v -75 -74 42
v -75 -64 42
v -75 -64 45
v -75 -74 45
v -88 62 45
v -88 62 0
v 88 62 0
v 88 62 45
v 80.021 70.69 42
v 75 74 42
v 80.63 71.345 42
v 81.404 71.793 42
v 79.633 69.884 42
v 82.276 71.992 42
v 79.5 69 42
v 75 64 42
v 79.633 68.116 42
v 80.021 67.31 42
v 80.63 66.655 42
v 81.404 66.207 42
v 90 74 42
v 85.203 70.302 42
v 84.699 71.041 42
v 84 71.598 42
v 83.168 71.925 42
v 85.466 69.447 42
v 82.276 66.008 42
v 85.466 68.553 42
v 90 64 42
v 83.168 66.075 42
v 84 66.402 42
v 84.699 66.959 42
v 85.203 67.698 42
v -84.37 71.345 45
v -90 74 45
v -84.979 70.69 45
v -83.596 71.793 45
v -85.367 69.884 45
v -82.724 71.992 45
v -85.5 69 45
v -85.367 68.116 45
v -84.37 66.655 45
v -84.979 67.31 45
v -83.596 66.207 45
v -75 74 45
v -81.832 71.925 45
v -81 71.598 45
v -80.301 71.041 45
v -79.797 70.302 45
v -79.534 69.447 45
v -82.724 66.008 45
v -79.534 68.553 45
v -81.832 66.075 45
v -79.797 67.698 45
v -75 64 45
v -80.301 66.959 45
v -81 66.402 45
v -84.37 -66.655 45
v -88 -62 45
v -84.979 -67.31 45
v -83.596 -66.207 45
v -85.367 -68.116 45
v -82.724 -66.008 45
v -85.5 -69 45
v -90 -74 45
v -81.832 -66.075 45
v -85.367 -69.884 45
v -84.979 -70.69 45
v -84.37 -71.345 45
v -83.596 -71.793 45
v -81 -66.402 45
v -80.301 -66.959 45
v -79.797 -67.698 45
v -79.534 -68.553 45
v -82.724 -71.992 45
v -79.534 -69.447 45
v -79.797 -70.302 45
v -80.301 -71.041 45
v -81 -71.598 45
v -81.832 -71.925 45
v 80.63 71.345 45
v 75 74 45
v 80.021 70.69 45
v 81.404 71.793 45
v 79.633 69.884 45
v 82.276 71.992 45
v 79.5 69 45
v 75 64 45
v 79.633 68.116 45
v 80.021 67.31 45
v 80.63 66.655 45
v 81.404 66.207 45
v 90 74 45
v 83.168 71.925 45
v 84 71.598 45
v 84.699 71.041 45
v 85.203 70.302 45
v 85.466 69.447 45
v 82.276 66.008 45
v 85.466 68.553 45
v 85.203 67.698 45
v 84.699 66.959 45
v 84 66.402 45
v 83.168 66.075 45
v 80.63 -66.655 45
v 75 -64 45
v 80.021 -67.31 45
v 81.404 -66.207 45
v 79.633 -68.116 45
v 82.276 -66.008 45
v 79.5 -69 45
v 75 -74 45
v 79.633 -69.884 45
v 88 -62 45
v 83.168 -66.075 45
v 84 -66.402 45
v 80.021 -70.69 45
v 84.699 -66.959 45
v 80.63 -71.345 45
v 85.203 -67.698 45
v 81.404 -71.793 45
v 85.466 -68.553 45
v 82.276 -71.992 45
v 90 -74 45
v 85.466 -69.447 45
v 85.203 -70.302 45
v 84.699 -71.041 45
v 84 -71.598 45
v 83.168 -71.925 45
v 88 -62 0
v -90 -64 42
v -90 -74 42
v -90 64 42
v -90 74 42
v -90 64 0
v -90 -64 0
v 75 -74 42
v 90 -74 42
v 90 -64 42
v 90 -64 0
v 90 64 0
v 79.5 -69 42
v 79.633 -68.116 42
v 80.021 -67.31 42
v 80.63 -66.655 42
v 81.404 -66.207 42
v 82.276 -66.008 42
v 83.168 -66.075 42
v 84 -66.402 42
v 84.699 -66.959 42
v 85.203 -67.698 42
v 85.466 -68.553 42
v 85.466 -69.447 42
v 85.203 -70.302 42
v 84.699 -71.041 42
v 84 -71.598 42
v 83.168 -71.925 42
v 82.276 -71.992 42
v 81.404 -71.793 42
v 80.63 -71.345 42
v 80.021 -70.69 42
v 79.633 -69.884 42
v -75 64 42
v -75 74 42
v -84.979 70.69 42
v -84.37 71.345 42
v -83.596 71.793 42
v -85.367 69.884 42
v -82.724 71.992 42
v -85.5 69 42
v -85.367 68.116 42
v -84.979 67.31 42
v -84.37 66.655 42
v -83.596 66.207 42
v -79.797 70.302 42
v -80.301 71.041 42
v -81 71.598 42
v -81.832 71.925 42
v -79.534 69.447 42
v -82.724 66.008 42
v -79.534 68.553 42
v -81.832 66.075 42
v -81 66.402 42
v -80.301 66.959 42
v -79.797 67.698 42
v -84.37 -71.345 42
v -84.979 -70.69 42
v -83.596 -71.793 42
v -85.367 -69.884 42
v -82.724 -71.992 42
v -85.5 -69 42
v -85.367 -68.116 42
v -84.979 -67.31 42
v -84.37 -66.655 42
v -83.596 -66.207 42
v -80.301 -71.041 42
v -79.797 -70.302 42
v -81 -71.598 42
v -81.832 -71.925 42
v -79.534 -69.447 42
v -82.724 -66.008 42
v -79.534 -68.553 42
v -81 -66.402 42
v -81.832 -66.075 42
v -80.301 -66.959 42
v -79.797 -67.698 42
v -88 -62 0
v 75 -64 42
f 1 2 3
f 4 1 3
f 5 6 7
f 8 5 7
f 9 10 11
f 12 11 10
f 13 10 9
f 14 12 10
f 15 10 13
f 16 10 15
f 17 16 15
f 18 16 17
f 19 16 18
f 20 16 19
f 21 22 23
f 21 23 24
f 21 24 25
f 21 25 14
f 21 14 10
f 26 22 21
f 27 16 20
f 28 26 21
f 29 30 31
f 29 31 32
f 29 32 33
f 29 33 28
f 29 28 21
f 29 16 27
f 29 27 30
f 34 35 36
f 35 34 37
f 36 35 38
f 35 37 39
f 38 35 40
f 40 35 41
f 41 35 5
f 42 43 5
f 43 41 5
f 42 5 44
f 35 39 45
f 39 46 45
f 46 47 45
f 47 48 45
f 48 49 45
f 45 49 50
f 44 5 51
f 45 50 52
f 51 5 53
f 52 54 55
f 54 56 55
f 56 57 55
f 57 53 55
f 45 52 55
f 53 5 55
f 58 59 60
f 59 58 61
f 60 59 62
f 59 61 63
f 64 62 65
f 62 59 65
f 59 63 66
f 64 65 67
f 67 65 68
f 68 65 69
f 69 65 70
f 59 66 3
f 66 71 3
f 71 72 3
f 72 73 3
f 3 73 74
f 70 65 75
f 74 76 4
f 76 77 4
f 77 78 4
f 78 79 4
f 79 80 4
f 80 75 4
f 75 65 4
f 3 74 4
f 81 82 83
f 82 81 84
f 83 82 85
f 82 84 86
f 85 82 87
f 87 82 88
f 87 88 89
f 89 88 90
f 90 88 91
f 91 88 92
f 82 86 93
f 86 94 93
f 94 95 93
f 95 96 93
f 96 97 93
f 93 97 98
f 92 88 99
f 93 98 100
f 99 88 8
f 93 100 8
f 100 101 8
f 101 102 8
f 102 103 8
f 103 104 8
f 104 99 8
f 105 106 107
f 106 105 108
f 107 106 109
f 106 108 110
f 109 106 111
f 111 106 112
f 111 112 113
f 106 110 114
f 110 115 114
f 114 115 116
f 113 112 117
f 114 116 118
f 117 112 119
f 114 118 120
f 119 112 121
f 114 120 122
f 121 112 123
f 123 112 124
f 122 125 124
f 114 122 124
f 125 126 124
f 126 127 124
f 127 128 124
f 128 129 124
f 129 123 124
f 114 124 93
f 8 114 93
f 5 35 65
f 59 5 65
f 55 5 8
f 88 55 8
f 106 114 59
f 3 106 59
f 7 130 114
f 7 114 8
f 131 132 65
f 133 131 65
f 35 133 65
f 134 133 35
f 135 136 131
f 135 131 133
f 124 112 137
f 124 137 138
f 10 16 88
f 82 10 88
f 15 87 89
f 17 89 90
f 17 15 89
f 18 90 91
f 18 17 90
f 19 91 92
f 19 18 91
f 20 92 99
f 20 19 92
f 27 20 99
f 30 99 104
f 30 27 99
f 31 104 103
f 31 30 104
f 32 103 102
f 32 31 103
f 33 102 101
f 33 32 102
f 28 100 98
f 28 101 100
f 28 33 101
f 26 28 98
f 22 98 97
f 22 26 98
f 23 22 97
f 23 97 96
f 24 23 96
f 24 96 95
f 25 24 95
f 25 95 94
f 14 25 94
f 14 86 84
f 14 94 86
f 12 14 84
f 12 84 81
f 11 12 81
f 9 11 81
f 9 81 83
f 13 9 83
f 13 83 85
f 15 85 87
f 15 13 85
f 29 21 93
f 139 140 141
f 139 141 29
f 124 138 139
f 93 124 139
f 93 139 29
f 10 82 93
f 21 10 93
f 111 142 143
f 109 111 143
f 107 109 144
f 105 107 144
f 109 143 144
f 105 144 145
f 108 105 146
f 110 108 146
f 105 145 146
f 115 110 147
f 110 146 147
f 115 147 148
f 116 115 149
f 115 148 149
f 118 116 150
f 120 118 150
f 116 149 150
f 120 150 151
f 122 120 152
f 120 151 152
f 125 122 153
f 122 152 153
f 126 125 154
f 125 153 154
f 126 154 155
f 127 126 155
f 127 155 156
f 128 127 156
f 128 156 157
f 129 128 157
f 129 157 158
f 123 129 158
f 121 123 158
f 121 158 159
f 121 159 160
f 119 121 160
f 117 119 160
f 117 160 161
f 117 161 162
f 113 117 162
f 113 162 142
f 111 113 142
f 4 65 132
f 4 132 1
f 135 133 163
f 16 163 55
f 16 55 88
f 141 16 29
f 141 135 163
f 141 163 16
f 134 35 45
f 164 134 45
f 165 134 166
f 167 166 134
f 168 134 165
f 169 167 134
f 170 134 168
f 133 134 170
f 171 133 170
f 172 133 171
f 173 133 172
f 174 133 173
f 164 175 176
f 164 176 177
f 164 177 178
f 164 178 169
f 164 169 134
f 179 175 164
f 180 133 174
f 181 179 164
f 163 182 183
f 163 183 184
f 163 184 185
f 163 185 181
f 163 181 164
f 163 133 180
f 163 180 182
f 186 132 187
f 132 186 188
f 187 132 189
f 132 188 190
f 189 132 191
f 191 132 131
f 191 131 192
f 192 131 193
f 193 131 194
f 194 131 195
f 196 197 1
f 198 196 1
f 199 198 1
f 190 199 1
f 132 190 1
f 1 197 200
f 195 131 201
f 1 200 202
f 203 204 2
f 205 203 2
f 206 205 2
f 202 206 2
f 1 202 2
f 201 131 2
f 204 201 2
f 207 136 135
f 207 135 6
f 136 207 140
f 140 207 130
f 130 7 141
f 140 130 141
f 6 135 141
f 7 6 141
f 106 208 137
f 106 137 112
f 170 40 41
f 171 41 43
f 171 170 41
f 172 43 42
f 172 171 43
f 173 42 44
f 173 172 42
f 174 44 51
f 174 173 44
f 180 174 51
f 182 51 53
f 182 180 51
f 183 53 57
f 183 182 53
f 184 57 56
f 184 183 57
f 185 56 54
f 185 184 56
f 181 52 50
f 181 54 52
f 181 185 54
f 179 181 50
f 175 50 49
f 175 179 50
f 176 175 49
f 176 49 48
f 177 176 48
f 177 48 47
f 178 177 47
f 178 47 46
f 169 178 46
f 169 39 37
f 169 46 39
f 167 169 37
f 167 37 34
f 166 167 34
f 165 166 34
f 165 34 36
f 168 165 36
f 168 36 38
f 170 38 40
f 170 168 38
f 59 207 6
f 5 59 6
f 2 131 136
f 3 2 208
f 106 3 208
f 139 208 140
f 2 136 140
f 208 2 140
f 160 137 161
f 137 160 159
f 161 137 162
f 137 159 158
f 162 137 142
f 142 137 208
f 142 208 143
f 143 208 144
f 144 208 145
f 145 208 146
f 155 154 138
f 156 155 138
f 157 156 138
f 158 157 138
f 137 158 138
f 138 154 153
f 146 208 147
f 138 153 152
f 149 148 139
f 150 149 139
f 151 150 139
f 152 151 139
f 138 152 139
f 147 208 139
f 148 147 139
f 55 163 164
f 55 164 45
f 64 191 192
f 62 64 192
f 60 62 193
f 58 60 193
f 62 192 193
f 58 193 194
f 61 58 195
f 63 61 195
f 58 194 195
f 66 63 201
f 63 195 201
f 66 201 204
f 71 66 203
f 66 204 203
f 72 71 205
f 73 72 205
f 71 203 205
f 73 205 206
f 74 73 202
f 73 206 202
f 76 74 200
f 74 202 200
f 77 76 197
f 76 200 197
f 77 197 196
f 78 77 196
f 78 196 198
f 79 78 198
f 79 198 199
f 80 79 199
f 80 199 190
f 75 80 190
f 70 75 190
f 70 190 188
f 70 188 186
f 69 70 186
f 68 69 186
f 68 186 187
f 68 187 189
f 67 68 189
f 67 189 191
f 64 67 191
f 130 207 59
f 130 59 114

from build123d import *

# Parameters (mm, degrees)
SKETCH_1_W          = 180
SKETCH_1_H          = 128
SKETCH_1_W_2        = 176
SKETCH_1_H_2        = 124
EXTRUDE_1_DEPTH     = 45
SKETCH_2_W          = 15
SKETCH_2_H          = 3
EXTRUDE_2_DEPTH     = 10
SKETCH_3_R          = 3
CUT_EXTRUDE_1_DEPTH = 10


with BuildPart() as part:
    # 草圖1 → 填料-伸長1 (new body)
    with BuildSketch(Plane.XY):
        Rectangle(SKETCH_1_W, SKETCH_1_H)
        Rectangle(SKETCH_1_W_2, SKETCH_1_H_2, mode=Mode.SUBTRACT)
    extrude(amount=EXTRUDE_1_DEPTH)

    # 草圖2 → 填料-伸長2 (add)
    with BuildSketch(Plane.XZ.offset(64)):
        with Locations((82.5, 43.5)):
            Rectangle(SKETCH_2_W, SKETCH_2_H)
        with Locations((-82.5, 43.5)):
            Rectangle(SKETCH_2_W, SKETCH_2_H)
    extrude_2 = extrude(amount=EXTRUDE_2_DEPTH)

    # 草圖3 → 除料-伸長1 (cut)
    with BuildSketch(Plane(origin=(0, 0, 42), x_dir=(-1, 0, 0), z_dir=(0, 0, -1))):
        with Locations((-82.5, -69)):
            Circle(SKETCH_3_R)
        with Locations((82.5, -69)):
            Circle(SKETCH_3_R)
    cut_extrude_1 = extrude(amount=-CUT_EXTRUDE_1_DEPTH, mode=Mode.SUBTRACT)

    # 鏡射1: 填料-伸長2 across plane
    add(extrude_2.mirror(Plane.ZX))

    # 鏡射3: 除料-伸長1 across plane
    add(cut_extrude_1.mirror(Plane.ZX), mode=Mode.SUBTRACT)


solid = part.part
